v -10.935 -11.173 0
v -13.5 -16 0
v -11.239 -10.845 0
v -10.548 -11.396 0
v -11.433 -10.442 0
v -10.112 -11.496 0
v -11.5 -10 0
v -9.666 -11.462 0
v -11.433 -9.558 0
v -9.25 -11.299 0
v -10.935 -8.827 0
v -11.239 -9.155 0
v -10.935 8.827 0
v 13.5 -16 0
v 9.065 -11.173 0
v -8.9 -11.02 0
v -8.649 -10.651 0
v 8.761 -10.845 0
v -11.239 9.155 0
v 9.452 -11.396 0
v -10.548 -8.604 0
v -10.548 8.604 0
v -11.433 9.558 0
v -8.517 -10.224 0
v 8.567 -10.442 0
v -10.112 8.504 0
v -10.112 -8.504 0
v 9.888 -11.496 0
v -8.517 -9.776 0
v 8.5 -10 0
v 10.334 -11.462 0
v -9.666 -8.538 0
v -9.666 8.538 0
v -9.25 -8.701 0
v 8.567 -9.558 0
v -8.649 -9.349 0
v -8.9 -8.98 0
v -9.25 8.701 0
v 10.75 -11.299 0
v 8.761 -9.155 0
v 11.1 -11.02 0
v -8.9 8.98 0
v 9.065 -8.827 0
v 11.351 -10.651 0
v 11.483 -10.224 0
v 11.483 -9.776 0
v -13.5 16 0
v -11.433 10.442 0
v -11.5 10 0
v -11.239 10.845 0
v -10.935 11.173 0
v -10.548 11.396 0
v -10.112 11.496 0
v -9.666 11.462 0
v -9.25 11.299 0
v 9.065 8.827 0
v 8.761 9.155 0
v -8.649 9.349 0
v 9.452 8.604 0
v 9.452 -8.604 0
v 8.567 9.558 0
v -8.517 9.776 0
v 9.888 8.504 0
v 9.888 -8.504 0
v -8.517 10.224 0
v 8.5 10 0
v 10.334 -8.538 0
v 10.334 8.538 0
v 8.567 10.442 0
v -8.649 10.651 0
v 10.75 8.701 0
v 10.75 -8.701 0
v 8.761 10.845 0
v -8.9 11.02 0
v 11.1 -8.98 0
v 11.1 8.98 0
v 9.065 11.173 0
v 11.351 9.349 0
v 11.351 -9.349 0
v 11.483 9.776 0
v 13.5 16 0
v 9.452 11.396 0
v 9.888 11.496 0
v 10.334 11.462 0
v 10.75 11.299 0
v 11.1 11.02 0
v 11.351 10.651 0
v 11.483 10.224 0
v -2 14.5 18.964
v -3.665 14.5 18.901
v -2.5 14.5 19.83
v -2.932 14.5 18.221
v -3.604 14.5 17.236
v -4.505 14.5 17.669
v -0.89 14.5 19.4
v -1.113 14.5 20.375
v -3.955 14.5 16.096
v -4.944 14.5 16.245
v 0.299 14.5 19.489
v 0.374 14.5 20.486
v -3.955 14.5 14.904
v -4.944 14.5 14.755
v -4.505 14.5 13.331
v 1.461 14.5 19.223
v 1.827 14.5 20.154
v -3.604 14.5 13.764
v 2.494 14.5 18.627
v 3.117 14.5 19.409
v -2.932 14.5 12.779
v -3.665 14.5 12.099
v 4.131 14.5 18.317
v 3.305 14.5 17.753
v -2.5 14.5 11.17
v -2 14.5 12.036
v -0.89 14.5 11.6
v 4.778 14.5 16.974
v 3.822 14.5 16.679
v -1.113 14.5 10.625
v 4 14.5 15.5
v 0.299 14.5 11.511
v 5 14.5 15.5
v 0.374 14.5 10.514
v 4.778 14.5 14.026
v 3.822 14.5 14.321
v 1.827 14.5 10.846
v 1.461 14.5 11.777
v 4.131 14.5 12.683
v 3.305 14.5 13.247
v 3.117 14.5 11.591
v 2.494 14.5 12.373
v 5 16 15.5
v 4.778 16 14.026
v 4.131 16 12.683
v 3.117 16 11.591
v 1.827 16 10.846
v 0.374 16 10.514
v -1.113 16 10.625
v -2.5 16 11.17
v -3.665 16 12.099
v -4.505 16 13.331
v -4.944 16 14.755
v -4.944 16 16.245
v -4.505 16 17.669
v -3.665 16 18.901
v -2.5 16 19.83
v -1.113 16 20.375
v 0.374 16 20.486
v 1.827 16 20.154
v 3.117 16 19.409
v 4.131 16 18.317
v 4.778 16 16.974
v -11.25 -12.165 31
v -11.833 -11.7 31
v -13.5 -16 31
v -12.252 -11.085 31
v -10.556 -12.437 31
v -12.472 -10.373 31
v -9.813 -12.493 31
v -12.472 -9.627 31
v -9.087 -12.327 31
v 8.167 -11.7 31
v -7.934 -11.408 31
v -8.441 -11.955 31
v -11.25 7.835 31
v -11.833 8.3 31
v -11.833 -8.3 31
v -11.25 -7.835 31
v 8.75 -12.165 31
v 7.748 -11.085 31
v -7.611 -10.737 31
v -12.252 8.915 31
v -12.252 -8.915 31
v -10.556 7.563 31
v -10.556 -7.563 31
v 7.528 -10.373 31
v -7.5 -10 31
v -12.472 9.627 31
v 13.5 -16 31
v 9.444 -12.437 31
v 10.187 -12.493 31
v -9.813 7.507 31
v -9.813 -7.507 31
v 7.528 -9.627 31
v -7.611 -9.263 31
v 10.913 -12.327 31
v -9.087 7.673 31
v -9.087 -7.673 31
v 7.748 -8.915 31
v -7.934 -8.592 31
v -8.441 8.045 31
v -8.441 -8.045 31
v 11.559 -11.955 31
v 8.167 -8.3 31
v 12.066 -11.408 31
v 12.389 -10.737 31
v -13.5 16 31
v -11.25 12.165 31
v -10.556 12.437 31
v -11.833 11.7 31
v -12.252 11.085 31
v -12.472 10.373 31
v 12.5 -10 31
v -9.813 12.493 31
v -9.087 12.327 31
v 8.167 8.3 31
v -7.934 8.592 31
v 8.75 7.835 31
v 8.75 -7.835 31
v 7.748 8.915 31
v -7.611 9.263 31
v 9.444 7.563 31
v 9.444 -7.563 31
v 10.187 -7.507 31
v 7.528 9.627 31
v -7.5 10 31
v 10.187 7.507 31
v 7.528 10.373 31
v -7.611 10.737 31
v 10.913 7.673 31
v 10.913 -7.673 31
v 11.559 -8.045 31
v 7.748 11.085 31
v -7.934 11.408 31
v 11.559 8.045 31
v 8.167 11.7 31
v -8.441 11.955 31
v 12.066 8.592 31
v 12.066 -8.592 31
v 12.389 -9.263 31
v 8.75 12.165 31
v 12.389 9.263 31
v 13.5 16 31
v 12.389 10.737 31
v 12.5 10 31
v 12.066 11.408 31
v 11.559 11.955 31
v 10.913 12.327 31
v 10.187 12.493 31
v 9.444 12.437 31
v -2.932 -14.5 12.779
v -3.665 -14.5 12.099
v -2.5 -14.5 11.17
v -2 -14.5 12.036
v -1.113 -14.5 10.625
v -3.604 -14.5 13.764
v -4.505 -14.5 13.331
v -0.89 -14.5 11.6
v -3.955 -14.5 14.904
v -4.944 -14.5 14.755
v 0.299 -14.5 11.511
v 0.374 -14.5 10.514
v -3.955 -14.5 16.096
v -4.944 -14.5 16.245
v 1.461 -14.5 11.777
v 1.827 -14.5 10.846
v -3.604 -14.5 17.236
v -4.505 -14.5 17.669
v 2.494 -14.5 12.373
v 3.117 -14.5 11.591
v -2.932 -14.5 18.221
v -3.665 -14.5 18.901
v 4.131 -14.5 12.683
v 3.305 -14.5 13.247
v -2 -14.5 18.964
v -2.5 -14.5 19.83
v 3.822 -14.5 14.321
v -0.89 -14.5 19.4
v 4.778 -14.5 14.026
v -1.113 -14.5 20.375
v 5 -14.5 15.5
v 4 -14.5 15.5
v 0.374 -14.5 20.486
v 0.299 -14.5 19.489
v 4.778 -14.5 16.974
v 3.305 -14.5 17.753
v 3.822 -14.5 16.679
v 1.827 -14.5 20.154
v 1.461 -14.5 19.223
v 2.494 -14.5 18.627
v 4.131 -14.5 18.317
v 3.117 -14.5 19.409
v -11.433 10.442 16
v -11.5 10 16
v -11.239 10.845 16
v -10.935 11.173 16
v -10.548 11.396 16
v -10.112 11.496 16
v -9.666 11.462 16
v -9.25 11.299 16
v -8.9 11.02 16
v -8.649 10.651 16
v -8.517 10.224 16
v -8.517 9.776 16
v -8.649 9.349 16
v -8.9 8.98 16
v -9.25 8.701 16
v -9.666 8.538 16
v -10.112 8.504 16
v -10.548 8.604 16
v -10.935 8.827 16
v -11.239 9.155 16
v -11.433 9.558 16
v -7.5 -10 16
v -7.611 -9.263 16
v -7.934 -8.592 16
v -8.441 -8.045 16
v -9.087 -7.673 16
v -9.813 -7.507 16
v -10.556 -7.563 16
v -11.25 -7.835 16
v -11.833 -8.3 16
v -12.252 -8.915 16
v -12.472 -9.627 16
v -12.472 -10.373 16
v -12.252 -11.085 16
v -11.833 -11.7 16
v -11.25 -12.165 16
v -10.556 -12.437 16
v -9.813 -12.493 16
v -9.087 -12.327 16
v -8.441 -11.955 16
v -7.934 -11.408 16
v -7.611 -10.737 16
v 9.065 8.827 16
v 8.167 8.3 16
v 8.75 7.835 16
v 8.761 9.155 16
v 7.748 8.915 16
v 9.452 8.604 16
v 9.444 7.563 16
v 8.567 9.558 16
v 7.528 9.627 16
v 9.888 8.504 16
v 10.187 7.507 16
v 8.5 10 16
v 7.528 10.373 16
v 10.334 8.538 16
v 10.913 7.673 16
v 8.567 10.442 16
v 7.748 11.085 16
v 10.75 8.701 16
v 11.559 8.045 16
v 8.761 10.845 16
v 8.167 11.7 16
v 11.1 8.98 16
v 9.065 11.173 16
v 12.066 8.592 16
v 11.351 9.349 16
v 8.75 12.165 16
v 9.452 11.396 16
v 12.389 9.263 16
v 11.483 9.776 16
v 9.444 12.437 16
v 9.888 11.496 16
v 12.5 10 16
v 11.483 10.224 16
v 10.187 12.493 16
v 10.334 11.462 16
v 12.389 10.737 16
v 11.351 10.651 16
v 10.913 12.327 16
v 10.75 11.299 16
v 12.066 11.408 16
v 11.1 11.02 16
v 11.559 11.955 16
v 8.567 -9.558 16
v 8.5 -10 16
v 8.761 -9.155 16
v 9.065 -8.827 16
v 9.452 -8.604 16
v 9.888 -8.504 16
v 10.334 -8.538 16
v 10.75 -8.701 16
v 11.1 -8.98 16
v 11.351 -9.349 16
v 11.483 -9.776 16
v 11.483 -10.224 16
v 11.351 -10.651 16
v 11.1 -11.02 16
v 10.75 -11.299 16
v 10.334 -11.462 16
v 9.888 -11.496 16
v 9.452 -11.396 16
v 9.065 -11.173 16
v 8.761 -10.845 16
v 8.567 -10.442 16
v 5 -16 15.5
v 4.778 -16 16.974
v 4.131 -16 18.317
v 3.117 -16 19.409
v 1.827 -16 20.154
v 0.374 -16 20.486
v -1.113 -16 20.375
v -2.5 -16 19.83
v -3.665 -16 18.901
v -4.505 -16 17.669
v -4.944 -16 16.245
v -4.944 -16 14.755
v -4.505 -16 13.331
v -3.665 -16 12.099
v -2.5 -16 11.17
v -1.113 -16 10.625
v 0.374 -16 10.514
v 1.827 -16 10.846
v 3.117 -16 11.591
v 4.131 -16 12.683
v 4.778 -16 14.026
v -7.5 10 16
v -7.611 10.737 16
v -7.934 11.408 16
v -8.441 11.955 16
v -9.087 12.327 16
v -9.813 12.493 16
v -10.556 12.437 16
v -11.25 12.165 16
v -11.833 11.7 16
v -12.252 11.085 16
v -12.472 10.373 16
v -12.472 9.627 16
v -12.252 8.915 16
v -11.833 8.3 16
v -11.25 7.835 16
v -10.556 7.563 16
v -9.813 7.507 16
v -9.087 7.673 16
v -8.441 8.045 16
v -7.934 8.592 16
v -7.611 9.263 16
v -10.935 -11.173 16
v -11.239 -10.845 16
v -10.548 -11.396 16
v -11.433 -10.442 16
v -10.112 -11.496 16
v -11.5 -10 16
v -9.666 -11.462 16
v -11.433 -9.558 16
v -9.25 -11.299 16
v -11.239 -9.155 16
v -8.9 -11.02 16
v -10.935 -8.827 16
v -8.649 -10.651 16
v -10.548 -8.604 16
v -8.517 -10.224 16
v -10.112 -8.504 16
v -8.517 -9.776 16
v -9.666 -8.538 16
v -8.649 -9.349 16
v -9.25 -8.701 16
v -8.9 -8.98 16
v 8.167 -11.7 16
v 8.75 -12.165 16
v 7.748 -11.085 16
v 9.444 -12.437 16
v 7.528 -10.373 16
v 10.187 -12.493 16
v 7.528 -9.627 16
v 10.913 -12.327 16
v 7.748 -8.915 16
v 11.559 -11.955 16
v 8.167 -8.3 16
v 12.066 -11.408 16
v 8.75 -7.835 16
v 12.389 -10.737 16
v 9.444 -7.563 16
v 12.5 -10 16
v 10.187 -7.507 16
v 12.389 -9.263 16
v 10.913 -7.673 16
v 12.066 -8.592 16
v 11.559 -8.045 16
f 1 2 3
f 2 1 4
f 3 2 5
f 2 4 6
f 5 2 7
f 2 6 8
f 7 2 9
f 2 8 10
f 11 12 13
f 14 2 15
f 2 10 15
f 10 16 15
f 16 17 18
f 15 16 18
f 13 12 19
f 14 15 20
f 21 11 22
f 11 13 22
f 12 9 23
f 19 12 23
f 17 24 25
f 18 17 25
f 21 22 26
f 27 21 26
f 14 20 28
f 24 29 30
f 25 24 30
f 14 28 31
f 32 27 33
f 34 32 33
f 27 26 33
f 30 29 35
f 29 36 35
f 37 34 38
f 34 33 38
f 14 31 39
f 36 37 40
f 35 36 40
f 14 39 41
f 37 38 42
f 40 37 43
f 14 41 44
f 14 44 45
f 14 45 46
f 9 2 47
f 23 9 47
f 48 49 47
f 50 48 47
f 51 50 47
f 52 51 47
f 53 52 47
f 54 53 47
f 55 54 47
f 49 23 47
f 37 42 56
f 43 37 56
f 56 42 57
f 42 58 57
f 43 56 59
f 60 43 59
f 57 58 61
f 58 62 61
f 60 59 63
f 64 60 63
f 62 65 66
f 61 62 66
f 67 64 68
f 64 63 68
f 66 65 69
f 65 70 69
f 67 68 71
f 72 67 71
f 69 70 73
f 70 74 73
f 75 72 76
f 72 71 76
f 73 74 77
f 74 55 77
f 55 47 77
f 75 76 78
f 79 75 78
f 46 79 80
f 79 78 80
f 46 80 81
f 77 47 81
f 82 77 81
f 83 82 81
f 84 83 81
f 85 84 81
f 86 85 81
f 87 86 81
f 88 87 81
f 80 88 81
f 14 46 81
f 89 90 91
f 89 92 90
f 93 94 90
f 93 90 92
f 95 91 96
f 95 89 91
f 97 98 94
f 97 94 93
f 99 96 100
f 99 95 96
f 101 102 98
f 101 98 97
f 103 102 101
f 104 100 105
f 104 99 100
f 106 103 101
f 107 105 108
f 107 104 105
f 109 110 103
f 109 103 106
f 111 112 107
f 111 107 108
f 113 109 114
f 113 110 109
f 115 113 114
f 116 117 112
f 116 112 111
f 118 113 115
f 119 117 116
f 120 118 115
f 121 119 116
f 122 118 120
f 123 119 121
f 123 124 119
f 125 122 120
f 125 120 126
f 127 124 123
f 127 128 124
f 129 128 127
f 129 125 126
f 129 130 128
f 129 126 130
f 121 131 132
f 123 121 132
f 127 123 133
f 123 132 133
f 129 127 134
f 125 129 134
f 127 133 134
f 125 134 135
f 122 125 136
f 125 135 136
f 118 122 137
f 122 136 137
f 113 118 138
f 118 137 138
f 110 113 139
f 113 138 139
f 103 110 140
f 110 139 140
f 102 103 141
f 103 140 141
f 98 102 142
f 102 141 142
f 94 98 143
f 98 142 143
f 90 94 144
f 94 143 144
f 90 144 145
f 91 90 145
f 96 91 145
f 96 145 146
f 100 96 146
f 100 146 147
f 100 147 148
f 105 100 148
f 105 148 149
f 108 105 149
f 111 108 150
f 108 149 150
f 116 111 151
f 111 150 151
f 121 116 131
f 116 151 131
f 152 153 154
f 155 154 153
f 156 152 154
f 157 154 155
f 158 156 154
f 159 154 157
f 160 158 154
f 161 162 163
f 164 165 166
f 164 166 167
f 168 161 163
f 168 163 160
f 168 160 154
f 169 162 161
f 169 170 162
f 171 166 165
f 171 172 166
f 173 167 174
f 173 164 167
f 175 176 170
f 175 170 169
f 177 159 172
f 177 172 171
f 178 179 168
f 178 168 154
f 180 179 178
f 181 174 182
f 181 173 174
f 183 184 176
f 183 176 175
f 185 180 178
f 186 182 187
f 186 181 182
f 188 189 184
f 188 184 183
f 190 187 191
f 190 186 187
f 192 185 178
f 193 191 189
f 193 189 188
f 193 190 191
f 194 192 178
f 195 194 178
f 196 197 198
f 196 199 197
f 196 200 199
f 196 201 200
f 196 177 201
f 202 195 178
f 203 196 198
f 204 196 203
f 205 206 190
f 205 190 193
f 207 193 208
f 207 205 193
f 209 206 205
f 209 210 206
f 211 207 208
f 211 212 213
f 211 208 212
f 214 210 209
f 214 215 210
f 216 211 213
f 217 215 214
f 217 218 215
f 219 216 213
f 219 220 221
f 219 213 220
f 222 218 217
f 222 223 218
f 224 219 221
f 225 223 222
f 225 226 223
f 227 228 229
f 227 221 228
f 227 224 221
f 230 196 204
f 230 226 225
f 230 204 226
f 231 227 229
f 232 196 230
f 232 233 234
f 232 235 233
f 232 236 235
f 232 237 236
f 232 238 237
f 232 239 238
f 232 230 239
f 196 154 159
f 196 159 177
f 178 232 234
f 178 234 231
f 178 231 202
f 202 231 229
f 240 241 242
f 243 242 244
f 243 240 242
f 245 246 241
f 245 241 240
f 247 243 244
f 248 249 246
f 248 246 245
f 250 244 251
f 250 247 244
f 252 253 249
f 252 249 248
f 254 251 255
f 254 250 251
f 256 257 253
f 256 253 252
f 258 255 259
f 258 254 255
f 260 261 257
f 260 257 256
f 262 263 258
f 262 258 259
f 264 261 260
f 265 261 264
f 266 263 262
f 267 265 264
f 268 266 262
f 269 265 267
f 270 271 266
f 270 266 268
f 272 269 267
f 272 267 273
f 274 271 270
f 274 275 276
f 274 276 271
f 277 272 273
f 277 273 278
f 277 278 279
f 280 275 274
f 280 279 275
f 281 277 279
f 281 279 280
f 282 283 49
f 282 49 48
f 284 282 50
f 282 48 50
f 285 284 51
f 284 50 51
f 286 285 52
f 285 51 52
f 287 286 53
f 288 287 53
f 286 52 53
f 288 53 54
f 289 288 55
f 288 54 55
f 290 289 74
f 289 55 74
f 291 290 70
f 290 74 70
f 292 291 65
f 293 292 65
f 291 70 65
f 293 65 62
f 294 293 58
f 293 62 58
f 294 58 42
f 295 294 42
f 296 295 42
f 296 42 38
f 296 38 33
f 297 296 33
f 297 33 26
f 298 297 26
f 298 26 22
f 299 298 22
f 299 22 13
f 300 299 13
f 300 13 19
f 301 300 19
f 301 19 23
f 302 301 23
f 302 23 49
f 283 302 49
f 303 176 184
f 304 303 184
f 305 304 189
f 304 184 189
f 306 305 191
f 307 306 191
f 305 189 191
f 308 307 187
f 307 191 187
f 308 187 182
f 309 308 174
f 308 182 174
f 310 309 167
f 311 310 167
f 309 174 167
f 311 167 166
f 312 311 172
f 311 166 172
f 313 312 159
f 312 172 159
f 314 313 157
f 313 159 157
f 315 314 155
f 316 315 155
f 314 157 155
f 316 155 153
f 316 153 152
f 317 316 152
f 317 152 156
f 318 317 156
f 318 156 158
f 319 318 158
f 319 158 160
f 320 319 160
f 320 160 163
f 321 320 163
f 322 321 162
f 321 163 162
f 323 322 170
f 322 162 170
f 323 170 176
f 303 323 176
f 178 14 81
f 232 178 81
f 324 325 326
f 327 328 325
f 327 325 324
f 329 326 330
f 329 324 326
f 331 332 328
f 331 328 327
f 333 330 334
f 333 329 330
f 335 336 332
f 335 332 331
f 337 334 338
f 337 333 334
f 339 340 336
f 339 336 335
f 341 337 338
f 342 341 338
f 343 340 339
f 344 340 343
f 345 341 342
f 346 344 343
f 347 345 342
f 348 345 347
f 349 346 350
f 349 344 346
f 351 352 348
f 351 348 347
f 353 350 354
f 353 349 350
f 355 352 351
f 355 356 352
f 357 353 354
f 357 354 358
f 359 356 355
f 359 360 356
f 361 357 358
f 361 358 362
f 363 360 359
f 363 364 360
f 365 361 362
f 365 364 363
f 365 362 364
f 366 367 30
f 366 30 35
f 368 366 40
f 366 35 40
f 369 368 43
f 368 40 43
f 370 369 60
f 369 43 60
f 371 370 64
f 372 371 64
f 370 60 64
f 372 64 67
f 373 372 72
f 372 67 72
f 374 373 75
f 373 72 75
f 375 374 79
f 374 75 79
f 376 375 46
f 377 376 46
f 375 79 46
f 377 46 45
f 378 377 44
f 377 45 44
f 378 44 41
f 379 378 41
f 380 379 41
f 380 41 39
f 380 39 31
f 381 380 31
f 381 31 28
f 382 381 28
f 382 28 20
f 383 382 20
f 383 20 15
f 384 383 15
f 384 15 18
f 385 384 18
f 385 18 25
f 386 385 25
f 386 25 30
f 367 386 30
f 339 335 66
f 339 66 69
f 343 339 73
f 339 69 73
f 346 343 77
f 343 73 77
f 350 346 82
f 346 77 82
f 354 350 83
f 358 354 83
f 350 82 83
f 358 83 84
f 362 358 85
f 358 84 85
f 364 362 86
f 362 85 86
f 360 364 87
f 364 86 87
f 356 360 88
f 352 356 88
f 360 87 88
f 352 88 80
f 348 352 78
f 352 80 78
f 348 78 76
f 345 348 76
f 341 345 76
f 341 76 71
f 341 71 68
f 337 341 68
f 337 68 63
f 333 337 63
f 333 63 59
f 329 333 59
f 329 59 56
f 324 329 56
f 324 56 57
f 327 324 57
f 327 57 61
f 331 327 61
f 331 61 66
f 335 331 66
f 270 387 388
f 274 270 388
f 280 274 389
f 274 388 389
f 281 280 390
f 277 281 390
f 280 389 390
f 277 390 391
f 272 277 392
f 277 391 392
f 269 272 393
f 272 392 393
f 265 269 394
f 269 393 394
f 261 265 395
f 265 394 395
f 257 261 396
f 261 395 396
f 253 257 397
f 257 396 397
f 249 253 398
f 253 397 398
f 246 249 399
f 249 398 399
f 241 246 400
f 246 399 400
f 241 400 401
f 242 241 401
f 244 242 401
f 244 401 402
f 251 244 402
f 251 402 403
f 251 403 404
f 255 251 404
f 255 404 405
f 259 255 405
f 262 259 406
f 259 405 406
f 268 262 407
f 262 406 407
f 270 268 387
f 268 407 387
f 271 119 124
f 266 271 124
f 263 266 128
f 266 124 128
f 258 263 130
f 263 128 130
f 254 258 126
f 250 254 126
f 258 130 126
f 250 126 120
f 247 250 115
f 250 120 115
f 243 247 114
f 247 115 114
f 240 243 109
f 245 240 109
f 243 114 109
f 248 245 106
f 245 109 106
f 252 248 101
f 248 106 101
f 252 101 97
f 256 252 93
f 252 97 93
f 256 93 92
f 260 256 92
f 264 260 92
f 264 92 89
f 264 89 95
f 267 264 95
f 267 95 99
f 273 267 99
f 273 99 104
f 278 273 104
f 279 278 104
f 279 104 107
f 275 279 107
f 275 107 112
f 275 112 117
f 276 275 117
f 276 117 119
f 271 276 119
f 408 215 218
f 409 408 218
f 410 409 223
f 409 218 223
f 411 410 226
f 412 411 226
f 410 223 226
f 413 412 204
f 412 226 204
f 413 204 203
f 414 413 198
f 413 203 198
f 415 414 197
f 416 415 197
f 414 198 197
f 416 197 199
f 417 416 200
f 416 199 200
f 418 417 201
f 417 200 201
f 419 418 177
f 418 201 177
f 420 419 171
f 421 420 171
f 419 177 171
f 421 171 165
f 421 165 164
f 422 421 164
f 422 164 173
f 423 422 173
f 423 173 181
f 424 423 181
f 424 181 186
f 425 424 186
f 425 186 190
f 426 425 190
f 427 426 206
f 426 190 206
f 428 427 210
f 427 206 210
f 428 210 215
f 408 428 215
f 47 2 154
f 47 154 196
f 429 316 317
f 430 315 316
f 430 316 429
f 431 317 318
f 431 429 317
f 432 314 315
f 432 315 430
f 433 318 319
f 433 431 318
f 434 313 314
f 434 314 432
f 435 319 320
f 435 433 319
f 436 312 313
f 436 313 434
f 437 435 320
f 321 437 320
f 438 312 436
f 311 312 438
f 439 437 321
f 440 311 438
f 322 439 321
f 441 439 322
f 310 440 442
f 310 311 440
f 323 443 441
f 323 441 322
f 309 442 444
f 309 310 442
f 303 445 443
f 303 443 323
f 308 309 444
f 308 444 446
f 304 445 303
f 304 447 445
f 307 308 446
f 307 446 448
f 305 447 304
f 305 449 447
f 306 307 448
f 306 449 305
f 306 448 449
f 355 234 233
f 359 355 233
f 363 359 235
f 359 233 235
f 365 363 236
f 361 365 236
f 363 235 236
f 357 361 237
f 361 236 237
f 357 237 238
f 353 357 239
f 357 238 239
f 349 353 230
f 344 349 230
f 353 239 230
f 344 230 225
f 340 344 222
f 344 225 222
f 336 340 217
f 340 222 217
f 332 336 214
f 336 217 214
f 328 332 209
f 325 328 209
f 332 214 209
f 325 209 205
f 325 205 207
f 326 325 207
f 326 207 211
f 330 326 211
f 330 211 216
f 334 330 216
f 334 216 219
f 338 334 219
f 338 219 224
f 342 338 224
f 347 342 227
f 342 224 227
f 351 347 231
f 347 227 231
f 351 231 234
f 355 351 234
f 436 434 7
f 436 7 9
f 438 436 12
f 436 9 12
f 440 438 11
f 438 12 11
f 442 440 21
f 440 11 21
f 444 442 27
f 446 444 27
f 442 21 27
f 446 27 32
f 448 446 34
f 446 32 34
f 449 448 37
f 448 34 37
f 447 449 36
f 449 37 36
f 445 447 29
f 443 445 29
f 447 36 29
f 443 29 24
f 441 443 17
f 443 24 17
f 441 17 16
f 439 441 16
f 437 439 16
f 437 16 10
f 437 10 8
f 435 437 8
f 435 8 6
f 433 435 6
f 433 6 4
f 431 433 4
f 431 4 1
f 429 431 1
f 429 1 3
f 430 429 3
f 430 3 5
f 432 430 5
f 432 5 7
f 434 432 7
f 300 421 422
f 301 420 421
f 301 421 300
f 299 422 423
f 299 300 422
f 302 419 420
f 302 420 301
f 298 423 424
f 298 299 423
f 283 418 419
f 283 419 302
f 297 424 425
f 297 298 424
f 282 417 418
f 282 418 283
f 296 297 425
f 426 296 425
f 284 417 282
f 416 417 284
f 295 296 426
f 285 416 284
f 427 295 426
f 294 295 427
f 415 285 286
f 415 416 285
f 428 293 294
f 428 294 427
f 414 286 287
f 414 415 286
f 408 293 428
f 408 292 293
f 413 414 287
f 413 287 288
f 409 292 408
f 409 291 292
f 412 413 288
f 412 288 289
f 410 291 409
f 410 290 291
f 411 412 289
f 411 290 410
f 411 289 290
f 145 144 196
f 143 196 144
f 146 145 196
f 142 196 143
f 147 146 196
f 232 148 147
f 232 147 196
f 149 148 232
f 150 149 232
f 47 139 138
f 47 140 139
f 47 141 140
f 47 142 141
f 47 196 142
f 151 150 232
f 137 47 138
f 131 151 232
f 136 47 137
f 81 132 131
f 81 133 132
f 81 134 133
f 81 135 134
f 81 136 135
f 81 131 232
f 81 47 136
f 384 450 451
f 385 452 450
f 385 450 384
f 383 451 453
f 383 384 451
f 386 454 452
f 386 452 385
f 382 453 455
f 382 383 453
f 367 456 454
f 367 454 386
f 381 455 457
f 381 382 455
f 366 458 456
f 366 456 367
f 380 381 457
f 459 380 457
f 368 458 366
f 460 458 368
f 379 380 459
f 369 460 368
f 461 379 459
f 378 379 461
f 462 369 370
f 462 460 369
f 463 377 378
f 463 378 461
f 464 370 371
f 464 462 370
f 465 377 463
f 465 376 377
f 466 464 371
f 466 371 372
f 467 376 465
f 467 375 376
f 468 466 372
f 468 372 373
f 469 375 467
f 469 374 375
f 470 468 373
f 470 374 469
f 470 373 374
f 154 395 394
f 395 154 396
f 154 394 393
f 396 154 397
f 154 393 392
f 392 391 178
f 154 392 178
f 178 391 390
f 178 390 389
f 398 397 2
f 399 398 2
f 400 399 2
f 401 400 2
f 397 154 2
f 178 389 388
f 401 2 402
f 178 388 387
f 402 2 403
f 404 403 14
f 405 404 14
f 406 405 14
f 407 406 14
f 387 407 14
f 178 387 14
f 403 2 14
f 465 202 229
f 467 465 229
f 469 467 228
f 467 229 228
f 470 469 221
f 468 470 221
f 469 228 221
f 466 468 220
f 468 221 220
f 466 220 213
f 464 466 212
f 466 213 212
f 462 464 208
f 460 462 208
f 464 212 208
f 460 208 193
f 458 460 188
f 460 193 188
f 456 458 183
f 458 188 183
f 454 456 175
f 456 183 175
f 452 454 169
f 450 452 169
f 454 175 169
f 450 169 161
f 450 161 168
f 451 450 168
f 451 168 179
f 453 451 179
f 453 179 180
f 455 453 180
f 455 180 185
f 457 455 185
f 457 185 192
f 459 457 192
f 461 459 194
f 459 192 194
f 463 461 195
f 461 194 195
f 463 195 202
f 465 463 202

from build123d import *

# Parameters (mm, degrees)
SCHIZZO1_W                   = 27
SCHIZZO1_H                   = 32
ESTRUSIONE_ESTRUSIONE1_DEPTH = 31
SCHIZZO2_R                   = 1.5
TAGLIO_ESTRUSIONE1_DEPTH     = 32
SCHIZZO3_R                   = 4
TAGLIO_ESTRUSIONE2_DEPTH     = 33
SCHIZZO4_R                   = 5
TAGLIO_ESTRUSIONE5_DEPTH     = 1.5
SCHIZZO5_R                   = 5
TAGLIO_ESTRUSIONE6_DEPTH     = 1.5
SCHIZZO6_R                   = 2.5
TAGLIO_ESTRUSIONE7_DEPTH     = 15


with BuildPart() as part:
    # Schizzo1 → Estrusione-Estrusione1 (new body)
    with BuildSketch(Plane.XY):
        Rectangle(SCHIZZO1_W, SCHIZZO1_H)
    extrude(amount=ESTRUSIONE_ESTRUSIONE1_DEPTH)

    # Schizzo2 → Taglio-Estrusione1 (cut, through all)
    with BuildSketch(Plane(origin=(0, 0, 0), x_dir=(-1, 0, 0), z_dir=(0, 0, -1))):
        with Locations((-10, 10)):
            Circle(SCHIZZO2_R)
        with Locations((10, 10)):
            Circle(SCHIZZO2_R)
        with Locations((10, -10)):
            Circle(SCHIZZO2_R)
        with Locations((-10, -10)):
            Circle(SCHIZZO2_R)
    extrude(amount=-TAGLIO_ESTRUSIONE1_DEPTH, mode=Mode.SUBTRACT)

    # Schizzo3 → Taglio-Estrusione2 (cut, through all)
    with BuildSketch(Plane(origin=(0, 16, 0), x_dir=(1, 0, 0), z_dir=(0, 1, 0))):
        with Locations((0, -15.5)):
            Circle(SCHIZZO3_R)
    extrude(amount=-TAGLIO_ESTRUSIONE2_DEPTH, mode=Mode.SUBTRACT)

    # Schizzo4 → Taglio-Estrusione5 (cut)
    with BuildSketch(Plane(origin=(0, 16, 0), x_dir=(1, 0, 0), z_dir=(0, 1, 0))):
        with Locations((0, -15.5)):
            Circle(SCHIZZO4_R)
    extrude(amount=-TAGLIO_ESTRUSIONE5_DEPTH, mode=Mode.SUBTRACT)

    # Schizzo5 → Taglio-Estrusione6 (cut)
    with BuildSketch(Plane.XZ.offset(16)):
        with Locations((0, 15.5)):
            Circle(SCHIZZO5_R)
    extrude(amount=-TAGLIO_ESTRUSIONE6_DEPTH, mode=Mode.SUBTRACT)

    # Schizzo6 → Taglio-Estrusione7 (cut)
    with BuildSketch(Plane.XY.offset(31)):
        with Locations((-10, 10)):
            Circle(SCHIZZO6_R)
        with Locations((10, 10)):
            Circle(SCHIZZO6_R)
        with Locations((10, -10)):
            Circle(SCHIZZO6_R)
        with Locations((-10, -10)):
            Circle(SCHIZZO6_R)
    extrude(amount=-TAGLIO_ESTRUSIONE7_DEPTH, mode=Mode.SUBTRACT)


solid = part.part
